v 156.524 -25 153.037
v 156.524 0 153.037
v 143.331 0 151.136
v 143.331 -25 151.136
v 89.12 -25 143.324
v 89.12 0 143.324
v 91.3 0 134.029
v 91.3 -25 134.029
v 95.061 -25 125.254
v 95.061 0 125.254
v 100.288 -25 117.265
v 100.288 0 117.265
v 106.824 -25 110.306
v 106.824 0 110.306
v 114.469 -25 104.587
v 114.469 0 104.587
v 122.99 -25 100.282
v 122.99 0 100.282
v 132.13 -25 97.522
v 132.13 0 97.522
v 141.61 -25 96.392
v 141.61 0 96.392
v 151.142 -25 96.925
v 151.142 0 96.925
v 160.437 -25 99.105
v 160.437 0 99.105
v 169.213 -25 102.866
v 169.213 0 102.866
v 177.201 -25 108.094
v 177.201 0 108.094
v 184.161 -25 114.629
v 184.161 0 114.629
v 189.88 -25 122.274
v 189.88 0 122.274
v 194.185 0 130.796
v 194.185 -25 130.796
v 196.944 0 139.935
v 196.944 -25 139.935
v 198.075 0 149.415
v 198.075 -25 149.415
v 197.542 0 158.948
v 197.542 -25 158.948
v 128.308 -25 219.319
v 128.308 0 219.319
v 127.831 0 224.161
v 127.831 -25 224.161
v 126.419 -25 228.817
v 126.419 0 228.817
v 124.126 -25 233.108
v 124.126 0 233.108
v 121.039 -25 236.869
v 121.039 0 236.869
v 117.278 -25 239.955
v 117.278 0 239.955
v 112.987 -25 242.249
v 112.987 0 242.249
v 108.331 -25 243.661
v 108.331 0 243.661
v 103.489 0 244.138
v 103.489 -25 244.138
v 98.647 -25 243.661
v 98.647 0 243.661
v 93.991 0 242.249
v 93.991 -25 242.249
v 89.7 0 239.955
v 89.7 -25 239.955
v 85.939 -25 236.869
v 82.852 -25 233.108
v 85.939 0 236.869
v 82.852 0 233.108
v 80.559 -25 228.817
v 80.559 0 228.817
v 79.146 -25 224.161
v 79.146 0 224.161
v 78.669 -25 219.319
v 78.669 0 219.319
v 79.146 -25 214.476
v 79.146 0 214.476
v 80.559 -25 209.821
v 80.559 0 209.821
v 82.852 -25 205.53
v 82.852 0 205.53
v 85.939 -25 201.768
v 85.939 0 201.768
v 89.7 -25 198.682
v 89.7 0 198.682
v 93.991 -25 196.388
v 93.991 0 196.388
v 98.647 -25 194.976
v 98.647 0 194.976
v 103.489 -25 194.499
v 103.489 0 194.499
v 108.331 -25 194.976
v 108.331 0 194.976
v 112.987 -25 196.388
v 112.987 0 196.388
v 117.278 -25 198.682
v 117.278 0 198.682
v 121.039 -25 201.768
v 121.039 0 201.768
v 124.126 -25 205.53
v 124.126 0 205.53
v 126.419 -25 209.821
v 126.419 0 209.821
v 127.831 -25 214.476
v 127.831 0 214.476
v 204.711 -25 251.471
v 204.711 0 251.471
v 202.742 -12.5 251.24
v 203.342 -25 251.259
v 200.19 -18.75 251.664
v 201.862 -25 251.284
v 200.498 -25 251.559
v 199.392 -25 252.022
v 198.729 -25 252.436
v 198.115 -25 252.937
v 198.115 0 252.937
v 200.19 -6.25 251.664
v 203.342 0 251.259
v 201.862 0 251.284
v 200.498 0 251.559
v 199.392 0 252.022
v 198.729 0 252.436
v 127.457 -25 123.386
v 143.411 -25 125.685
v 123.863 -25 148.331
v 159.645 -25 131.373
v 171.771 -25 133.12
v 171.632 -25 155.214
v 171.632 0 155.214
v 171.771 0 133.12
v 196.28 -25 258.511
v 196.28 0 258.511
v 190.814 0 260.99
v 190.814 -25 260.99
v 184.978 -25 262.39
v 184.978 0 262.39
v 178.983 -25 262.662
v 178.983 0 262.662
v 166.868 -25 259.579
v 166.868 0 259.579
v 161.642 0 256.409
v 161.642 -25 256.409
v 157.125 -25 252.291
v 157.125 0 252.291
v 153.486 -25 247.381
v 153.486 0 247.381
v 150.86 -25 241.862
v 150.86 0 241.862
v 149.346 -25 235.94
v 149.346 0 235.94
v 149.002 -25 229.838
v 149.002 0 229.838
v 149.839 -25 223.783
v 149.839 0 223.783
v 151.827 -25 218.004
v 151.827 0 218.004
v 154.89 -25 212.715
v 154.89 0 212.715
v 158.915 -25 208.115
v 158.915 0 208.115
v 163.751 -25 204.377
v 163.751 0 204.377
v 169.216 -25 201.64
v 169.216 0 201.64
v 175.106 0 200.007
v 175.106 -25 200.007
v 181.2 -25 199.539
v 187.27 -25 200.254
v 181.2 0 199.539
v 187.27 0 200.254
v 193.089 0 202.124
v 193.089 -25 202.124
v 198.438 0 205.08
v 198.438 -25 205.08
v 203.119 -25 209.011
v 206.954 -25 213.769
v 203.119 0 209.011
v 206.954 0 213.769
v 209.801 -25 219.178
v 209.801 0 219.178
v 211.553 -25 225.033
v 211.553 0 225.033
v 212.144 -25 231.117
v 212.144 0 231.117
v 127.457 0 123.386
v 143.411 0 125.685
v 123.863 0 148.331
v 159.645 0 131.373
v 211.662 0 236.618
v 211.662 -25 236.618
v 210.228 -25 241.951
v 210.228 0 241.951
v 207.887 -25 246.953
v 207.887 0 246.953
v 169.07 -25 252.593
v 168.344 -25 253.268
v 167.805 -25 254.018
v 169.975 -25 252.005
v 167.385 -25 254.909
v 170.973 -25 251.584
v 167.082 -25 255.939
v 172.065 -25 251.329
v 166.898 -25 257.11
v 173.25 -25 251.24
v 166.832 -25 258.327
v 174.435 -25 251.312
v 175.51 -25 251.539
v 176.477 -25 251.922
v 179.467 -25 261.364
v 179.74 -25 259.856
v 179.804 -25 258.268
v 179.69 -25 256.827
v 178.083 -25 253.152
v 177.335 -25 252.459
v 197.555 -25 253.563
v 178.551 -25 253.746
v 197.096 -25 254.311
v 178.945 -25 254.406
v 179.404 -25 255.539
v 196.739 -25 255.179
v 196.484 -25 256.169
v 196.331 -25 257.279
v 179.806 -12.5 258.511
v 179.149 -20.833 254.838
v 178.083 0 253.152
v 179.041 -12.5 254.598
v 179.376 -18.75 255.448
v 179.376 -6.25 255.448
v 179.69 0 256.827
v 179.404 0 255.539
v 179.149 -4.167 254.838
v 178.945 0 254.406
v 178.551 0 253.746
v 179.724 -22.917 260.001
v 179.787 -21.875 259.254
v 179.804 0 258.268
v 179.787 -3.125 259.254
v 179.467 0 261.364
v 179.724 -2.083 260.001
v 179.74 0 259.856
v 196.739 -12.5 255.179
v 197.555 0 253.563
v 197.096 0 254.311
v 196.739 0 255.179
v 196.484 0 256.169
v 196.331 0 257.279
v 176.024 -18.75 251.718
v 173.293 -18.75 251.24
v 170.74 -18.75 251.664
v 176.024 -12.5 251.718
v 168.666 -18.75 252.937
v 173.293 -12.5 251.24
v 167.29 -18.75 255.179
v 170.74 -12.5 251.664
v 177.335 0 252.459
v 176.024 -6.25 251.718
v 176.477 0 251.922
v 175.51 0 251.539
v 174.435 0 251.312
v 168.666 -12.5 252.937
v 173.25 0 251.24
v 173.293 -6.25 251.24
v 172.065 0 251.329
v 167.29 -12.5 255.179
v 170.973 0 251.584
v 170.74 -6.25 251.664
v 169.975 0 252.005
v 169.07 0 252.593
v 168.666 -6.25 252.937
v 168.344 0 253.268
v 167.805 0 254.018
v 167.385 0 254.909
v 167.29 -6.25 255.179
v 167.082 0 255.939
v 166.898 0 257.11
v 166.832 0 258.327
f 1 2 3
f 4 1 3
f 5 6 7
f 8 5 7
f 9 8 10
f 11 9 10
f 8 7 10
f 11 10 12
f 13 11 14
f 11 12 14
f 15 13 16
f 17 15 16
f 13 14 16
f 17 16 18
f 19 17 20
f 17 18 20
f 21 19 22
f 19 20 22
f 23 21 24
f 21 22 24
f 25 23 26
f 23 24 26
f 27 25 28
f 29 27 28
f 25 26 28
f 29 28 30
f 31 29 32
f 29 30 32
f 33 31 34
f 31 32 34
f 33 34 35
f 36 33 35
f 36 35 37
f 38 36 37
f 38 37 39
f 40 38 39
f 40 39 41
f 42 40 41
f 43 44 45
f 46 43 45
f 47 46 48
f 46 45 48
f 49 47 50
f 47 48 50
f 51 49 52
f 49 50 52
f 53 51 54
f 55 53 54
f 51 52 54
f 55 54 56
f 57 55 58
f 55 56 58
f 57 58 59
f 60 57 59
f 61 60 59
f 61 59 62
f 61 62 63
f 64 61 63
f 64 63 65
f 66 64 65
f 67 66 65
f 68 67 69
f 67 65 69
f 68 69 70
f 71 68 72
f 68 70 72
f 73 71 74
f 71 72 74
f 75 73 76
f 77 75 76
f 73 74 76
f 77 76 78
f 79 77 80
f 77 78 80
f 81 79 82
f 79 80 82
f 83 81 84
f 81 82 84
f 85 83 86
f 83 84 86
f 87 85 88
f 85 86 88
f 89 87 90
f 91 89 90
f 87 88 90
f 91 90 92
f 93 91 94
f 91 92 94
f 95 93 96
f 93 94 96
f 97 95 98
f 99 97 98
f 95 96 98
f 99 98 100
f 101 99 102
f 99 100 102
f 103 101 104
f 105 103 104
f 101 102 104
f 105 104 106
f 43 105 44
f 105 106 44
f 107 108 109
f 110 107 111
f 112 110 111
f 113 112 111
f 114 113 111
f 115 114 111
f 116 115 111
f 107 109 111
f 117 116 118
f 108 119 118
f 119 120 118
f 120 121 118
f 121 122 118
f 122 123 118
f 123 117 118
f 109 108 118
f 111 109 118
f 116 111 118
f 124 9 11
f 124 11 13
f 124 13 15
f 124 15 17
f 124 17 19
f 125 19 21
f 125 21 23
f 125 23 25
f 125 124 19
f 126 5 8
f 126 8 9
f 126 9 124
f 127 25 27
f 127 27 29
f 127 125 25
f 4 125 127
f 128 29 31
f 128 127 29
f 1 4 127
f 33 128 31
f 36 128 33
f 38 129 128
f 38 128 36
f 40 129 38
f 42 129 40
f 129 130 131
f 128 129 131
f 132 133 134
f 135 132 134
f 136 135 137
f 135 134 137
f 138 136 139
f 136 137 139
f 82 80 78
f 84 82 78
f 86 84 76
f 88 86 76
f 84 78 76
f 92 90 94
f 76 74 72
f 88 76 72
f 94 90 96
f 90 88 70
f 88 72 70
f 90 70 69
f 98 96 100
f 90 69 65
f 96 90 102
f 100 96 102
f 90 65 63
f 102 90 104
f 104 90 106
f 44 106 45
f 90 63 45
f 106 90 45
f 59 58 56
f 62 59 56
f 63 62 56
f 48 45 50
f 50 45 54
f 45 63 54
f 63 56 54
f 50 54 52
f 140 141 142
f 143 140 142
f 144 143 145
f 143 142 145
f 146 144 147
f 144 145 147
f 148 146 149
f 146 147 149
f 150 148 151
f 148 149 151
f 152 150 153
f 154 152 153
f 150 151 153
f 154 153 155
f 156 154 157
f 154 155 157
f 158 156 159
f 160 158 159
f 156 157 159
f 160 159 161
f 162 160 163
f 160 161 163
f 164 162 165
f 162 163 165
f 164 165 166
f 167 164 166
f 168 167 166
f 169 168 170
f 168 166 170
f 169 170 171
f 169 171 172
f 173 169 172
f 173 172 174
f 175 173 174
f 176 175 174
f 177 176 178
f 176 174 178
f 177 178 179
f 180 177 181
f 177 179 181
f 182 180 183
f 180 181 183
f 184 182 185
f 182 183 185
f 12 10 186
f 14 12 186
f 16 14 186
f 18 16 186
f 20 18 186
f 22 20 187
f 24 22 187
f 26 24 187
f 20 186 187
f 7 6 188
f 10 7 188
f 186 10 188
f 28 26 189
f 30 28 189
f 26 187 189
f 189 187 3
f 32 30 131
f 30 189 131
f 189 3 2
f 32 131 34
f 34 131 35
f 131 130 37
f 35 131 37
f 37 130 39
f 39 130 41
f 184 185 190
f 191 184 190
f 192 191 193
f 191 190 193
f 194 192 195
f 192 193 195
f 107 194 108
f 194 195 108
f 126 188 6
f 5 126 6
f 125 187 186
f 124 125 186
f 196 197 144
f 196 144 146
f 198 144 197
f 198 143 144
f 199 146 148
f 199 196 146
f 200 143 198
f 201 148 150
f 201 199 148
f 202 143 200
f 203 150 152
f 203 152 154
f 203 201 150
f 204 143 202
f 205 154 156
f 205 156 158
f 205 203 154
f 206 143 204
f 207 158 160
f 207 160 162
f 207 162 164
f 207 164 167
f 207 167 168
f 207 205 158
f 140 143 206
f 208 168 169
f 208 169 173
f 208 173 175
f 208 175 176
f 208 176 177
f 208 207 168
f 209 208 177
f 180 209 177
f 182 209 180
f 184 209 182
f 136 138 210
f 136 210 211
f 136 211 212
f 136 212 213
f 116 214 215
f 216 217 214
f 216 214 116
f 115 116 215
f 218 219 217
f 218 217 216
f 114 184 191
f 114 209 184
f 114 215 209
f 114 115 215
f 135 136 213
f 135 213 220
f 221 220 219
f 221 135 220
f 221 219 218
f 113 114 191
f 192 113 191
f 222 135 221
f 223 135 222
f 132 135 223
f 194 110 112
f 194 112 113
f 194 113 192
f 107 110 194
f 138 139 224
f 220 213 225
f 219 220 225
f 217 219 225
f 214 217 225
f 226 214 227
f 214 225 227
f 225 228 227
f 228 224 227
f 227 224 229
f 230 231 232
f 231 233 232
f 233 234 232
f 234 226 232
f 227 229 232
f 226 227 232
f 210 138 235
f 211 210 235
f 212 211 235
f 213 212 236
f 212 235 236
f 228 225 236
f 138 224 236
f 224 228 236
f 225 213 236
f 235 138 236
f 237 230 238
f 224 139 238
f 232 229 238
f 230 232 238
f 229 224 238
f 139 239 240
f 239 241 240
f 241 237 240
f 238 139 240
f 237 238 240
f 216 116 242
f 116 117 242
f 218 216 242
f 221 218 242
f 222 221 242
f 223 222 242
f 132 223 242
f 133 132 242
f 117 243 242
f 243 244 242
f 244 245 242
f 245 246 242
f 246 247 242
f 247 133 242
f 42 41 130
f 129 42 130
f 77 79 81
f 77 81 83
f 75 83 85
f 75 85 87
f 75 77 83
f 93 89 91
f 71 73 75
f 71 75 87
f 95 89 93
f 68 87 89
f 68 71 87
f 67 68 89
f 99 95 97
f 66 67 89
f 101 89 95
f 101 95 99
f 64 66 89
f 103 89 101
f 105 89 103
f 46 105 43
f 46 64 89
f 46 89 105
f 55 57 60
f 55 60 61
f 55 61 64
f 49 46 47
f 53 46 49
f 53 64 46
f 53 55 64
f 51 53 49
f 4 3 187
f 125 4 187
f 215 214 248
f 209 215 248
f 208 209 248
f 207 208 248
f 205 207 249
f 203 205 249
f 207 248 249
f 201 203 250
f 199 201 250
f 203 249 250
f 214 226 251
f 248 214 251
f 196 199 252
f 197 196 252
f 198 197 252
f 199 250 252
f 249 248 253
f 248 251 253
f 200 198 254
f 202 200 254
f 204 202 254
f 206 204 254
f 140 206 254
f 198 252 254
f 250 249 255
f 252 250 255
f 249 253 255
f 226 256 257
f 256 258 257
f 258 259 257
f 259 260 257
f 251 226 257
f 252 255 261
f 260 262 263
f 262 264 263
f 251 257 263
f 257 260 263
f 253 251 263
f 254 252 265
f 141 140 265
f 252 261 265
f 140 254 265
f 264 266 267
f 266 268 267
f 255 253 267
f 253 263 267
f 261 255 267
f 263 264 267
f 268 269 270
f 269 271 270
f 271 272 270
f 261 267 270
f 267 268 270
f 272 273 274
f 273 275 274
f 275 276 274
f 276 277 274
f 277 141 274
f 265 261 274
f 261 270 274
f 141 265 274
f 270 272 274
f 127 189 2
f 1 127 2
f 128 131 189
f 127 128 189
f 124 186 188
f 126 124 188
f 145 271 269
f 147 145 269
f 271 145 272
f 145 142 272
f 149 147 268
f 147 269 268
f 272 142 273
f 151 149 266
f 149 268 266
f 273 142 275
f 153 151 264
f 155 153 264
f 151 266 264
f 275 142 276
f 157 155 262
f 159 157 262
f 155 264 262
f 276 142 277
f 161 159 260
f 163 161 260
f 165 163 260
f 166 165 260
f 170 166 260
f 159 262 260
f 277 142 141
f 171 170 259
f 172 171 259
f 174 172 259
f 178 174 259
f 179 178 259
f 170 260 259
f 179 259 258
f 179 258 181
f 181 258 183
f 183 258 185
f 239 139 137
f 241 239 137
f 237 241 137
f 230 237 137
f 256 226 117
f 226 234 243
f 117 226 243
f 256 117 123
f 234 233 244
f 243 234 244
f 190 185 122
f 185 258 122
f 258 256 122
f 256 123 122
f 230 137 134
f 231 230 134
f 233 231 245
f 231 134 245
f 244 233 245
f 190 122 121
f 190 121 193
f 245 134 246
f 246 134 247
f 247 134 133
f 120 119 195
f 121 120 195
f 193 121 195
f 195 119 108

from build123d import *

# Parameters (mm, degrees)
F1_DEPTH = 25
F0_R     = 24.8195677996


with BuildPart() as f1:
    # F0 (on Front) → F1 (new body)
    with BuildSketch(Plane.XZ):
        with BuildLine():
            Line((123.8630347279, 148.3307930557), (89.11960572, 143.3243751526))
            ThreePointArc((89.11960572, 143.3243751526), (151.142437011, 96.9248600304), (197.5419521332, 158.9476913214))
            Line((197.5419521332, 158.9476913214), (171.6322098768, 155.214179656))
            Line((171.6322098768, 155.214179656), (171.7710671958, 133.1199479656))
            Line((171.7710671958, 133.1199479656), (159.6452806425, 131.3726605901))
            Line((159.6452806425, 131.3726605901), (156.5235088705, 153.0370637705))
            Line((156.5235088705, 153.0370637705), (143.3307789266, 151.136033237))
            Line((143.3307789266, 151.136033237), (143.4110715051, 125.685066173))
            Line((143.4110715051, 125.685066173), (127.4574710295, 123.3862029542))
            Line((127.4574710295, 123.3862029542), (123.8630347279, 148.3307930557))
        make_face()
    extrude(amount=F1_DEPTH)


with BuildPart() as f1b:
    # F0 (on Front) → F1, piece 2 (new body)
    with BuildSketch(Plane.XZ):
        with Locations((103.488817811, 219.3185389042)):
            Circle(F0_R)
    extrude(amount=F1_DEPTH)


with BuildPart() as f1c:
    # F0 (on Front) → F1, piece 3 (new body)
    with BuildSketch(Plane.XZ):
        with BuildLine():
            ThreePointArc((166.8678705537, 259.5786950078), (163.750928753, 204.3771076348), (212.1443264481, 231.116771698))
            ThreePointArc((212.1443264481, 231.116771698), (210.2279631008, 241.9510248807), (204.7114230047, 251.4705456604))
            add(Edge.make_bspline(
                [(204.7114230047, 251.4705456604), (203.8078626424, 251.2395767658), (202.7419998137, 251.2395767658)],
                knots=[0.6525044859, 0.6525044859, 0.6525044859, 1, 1, 1], degree=2))
            add(Edge.make_bspline(
                [(202.7419998137, 251.2395767658), (199.9504387875, 251.2395767658), (198.1152458906, 252.9369147972)],
                knots=[0, 0, 0, 1, 1, 1], degree=2))
            add(Edge.make_bspline(
                [(198.1152458906, 252.9369147972), (196.2801487484, 254.6341642668), (196.2800529987, 258.5110163296)],
                knots=[0, 0, 0, 0.9999478231, 0.9999478231, 0.9999478231], degree=2))
            ThreePointArc((196.2800529987, 258.5110163296), (187.9296328653, 261.8291568151), (178.9827488716, 262.6615266189))
            add(Edge.make_bspline(
                [(178.9827488716, 262.6615266189), (179.8063965673, 260.9962071412), (179.8063965673, 258.5114209206)],
                knots=[0.3033950235, 0.3033950235, 0.3033950235, 1, 1, 1], degree=2))
            add(Edge.make_bspline(
                [(179.8063965673, 258.5114209206), (179.8063965673, 255.0650492833), (178.0832107486, 253.1523130246)],
                knots=[0, 0, 0, 1, 1, 1], degree=2))
            add(Edge.make_bspline(
                [(178.0832107486, 253.1523130246), (176.3600249299, 251.2395767658), (173.2927541727, 251.2395767658)],
                knots=[0, 0, 0, 1, 1, 1], degree=2))
            add(Edge.make_bspline(
                [(173.2927541727, 251.2395767658), (170.5011931465, 251.2395767658), (168.6660002496, 252.9369147972)],
                knots=[0, 0, 0, 1, 1, 1], degree=2))
            add(Edge.make_bspline(
                [(168.6660002496, 252.9369147972), (166.8308073527, 254.6342528286), (166.8308073527, 258.5114209206)],
                knots=[0, 0, 0, 1, 1, 1], degree=2))
            add(Edge.make_bspline(
                [(166.8308073527, 258.5114209206), (166.8308073527, 259.0660604448), (166.8678705537, 259.5786950078)],
                knots=[0, 0, 0, 0.0757338042, 0.0757338042, 0.0757338042], degree=2))
        make_face()
    extrude(amount=F1_DEPTH)


solid = Compound([f1.part, f1b.part, f1c.part])
